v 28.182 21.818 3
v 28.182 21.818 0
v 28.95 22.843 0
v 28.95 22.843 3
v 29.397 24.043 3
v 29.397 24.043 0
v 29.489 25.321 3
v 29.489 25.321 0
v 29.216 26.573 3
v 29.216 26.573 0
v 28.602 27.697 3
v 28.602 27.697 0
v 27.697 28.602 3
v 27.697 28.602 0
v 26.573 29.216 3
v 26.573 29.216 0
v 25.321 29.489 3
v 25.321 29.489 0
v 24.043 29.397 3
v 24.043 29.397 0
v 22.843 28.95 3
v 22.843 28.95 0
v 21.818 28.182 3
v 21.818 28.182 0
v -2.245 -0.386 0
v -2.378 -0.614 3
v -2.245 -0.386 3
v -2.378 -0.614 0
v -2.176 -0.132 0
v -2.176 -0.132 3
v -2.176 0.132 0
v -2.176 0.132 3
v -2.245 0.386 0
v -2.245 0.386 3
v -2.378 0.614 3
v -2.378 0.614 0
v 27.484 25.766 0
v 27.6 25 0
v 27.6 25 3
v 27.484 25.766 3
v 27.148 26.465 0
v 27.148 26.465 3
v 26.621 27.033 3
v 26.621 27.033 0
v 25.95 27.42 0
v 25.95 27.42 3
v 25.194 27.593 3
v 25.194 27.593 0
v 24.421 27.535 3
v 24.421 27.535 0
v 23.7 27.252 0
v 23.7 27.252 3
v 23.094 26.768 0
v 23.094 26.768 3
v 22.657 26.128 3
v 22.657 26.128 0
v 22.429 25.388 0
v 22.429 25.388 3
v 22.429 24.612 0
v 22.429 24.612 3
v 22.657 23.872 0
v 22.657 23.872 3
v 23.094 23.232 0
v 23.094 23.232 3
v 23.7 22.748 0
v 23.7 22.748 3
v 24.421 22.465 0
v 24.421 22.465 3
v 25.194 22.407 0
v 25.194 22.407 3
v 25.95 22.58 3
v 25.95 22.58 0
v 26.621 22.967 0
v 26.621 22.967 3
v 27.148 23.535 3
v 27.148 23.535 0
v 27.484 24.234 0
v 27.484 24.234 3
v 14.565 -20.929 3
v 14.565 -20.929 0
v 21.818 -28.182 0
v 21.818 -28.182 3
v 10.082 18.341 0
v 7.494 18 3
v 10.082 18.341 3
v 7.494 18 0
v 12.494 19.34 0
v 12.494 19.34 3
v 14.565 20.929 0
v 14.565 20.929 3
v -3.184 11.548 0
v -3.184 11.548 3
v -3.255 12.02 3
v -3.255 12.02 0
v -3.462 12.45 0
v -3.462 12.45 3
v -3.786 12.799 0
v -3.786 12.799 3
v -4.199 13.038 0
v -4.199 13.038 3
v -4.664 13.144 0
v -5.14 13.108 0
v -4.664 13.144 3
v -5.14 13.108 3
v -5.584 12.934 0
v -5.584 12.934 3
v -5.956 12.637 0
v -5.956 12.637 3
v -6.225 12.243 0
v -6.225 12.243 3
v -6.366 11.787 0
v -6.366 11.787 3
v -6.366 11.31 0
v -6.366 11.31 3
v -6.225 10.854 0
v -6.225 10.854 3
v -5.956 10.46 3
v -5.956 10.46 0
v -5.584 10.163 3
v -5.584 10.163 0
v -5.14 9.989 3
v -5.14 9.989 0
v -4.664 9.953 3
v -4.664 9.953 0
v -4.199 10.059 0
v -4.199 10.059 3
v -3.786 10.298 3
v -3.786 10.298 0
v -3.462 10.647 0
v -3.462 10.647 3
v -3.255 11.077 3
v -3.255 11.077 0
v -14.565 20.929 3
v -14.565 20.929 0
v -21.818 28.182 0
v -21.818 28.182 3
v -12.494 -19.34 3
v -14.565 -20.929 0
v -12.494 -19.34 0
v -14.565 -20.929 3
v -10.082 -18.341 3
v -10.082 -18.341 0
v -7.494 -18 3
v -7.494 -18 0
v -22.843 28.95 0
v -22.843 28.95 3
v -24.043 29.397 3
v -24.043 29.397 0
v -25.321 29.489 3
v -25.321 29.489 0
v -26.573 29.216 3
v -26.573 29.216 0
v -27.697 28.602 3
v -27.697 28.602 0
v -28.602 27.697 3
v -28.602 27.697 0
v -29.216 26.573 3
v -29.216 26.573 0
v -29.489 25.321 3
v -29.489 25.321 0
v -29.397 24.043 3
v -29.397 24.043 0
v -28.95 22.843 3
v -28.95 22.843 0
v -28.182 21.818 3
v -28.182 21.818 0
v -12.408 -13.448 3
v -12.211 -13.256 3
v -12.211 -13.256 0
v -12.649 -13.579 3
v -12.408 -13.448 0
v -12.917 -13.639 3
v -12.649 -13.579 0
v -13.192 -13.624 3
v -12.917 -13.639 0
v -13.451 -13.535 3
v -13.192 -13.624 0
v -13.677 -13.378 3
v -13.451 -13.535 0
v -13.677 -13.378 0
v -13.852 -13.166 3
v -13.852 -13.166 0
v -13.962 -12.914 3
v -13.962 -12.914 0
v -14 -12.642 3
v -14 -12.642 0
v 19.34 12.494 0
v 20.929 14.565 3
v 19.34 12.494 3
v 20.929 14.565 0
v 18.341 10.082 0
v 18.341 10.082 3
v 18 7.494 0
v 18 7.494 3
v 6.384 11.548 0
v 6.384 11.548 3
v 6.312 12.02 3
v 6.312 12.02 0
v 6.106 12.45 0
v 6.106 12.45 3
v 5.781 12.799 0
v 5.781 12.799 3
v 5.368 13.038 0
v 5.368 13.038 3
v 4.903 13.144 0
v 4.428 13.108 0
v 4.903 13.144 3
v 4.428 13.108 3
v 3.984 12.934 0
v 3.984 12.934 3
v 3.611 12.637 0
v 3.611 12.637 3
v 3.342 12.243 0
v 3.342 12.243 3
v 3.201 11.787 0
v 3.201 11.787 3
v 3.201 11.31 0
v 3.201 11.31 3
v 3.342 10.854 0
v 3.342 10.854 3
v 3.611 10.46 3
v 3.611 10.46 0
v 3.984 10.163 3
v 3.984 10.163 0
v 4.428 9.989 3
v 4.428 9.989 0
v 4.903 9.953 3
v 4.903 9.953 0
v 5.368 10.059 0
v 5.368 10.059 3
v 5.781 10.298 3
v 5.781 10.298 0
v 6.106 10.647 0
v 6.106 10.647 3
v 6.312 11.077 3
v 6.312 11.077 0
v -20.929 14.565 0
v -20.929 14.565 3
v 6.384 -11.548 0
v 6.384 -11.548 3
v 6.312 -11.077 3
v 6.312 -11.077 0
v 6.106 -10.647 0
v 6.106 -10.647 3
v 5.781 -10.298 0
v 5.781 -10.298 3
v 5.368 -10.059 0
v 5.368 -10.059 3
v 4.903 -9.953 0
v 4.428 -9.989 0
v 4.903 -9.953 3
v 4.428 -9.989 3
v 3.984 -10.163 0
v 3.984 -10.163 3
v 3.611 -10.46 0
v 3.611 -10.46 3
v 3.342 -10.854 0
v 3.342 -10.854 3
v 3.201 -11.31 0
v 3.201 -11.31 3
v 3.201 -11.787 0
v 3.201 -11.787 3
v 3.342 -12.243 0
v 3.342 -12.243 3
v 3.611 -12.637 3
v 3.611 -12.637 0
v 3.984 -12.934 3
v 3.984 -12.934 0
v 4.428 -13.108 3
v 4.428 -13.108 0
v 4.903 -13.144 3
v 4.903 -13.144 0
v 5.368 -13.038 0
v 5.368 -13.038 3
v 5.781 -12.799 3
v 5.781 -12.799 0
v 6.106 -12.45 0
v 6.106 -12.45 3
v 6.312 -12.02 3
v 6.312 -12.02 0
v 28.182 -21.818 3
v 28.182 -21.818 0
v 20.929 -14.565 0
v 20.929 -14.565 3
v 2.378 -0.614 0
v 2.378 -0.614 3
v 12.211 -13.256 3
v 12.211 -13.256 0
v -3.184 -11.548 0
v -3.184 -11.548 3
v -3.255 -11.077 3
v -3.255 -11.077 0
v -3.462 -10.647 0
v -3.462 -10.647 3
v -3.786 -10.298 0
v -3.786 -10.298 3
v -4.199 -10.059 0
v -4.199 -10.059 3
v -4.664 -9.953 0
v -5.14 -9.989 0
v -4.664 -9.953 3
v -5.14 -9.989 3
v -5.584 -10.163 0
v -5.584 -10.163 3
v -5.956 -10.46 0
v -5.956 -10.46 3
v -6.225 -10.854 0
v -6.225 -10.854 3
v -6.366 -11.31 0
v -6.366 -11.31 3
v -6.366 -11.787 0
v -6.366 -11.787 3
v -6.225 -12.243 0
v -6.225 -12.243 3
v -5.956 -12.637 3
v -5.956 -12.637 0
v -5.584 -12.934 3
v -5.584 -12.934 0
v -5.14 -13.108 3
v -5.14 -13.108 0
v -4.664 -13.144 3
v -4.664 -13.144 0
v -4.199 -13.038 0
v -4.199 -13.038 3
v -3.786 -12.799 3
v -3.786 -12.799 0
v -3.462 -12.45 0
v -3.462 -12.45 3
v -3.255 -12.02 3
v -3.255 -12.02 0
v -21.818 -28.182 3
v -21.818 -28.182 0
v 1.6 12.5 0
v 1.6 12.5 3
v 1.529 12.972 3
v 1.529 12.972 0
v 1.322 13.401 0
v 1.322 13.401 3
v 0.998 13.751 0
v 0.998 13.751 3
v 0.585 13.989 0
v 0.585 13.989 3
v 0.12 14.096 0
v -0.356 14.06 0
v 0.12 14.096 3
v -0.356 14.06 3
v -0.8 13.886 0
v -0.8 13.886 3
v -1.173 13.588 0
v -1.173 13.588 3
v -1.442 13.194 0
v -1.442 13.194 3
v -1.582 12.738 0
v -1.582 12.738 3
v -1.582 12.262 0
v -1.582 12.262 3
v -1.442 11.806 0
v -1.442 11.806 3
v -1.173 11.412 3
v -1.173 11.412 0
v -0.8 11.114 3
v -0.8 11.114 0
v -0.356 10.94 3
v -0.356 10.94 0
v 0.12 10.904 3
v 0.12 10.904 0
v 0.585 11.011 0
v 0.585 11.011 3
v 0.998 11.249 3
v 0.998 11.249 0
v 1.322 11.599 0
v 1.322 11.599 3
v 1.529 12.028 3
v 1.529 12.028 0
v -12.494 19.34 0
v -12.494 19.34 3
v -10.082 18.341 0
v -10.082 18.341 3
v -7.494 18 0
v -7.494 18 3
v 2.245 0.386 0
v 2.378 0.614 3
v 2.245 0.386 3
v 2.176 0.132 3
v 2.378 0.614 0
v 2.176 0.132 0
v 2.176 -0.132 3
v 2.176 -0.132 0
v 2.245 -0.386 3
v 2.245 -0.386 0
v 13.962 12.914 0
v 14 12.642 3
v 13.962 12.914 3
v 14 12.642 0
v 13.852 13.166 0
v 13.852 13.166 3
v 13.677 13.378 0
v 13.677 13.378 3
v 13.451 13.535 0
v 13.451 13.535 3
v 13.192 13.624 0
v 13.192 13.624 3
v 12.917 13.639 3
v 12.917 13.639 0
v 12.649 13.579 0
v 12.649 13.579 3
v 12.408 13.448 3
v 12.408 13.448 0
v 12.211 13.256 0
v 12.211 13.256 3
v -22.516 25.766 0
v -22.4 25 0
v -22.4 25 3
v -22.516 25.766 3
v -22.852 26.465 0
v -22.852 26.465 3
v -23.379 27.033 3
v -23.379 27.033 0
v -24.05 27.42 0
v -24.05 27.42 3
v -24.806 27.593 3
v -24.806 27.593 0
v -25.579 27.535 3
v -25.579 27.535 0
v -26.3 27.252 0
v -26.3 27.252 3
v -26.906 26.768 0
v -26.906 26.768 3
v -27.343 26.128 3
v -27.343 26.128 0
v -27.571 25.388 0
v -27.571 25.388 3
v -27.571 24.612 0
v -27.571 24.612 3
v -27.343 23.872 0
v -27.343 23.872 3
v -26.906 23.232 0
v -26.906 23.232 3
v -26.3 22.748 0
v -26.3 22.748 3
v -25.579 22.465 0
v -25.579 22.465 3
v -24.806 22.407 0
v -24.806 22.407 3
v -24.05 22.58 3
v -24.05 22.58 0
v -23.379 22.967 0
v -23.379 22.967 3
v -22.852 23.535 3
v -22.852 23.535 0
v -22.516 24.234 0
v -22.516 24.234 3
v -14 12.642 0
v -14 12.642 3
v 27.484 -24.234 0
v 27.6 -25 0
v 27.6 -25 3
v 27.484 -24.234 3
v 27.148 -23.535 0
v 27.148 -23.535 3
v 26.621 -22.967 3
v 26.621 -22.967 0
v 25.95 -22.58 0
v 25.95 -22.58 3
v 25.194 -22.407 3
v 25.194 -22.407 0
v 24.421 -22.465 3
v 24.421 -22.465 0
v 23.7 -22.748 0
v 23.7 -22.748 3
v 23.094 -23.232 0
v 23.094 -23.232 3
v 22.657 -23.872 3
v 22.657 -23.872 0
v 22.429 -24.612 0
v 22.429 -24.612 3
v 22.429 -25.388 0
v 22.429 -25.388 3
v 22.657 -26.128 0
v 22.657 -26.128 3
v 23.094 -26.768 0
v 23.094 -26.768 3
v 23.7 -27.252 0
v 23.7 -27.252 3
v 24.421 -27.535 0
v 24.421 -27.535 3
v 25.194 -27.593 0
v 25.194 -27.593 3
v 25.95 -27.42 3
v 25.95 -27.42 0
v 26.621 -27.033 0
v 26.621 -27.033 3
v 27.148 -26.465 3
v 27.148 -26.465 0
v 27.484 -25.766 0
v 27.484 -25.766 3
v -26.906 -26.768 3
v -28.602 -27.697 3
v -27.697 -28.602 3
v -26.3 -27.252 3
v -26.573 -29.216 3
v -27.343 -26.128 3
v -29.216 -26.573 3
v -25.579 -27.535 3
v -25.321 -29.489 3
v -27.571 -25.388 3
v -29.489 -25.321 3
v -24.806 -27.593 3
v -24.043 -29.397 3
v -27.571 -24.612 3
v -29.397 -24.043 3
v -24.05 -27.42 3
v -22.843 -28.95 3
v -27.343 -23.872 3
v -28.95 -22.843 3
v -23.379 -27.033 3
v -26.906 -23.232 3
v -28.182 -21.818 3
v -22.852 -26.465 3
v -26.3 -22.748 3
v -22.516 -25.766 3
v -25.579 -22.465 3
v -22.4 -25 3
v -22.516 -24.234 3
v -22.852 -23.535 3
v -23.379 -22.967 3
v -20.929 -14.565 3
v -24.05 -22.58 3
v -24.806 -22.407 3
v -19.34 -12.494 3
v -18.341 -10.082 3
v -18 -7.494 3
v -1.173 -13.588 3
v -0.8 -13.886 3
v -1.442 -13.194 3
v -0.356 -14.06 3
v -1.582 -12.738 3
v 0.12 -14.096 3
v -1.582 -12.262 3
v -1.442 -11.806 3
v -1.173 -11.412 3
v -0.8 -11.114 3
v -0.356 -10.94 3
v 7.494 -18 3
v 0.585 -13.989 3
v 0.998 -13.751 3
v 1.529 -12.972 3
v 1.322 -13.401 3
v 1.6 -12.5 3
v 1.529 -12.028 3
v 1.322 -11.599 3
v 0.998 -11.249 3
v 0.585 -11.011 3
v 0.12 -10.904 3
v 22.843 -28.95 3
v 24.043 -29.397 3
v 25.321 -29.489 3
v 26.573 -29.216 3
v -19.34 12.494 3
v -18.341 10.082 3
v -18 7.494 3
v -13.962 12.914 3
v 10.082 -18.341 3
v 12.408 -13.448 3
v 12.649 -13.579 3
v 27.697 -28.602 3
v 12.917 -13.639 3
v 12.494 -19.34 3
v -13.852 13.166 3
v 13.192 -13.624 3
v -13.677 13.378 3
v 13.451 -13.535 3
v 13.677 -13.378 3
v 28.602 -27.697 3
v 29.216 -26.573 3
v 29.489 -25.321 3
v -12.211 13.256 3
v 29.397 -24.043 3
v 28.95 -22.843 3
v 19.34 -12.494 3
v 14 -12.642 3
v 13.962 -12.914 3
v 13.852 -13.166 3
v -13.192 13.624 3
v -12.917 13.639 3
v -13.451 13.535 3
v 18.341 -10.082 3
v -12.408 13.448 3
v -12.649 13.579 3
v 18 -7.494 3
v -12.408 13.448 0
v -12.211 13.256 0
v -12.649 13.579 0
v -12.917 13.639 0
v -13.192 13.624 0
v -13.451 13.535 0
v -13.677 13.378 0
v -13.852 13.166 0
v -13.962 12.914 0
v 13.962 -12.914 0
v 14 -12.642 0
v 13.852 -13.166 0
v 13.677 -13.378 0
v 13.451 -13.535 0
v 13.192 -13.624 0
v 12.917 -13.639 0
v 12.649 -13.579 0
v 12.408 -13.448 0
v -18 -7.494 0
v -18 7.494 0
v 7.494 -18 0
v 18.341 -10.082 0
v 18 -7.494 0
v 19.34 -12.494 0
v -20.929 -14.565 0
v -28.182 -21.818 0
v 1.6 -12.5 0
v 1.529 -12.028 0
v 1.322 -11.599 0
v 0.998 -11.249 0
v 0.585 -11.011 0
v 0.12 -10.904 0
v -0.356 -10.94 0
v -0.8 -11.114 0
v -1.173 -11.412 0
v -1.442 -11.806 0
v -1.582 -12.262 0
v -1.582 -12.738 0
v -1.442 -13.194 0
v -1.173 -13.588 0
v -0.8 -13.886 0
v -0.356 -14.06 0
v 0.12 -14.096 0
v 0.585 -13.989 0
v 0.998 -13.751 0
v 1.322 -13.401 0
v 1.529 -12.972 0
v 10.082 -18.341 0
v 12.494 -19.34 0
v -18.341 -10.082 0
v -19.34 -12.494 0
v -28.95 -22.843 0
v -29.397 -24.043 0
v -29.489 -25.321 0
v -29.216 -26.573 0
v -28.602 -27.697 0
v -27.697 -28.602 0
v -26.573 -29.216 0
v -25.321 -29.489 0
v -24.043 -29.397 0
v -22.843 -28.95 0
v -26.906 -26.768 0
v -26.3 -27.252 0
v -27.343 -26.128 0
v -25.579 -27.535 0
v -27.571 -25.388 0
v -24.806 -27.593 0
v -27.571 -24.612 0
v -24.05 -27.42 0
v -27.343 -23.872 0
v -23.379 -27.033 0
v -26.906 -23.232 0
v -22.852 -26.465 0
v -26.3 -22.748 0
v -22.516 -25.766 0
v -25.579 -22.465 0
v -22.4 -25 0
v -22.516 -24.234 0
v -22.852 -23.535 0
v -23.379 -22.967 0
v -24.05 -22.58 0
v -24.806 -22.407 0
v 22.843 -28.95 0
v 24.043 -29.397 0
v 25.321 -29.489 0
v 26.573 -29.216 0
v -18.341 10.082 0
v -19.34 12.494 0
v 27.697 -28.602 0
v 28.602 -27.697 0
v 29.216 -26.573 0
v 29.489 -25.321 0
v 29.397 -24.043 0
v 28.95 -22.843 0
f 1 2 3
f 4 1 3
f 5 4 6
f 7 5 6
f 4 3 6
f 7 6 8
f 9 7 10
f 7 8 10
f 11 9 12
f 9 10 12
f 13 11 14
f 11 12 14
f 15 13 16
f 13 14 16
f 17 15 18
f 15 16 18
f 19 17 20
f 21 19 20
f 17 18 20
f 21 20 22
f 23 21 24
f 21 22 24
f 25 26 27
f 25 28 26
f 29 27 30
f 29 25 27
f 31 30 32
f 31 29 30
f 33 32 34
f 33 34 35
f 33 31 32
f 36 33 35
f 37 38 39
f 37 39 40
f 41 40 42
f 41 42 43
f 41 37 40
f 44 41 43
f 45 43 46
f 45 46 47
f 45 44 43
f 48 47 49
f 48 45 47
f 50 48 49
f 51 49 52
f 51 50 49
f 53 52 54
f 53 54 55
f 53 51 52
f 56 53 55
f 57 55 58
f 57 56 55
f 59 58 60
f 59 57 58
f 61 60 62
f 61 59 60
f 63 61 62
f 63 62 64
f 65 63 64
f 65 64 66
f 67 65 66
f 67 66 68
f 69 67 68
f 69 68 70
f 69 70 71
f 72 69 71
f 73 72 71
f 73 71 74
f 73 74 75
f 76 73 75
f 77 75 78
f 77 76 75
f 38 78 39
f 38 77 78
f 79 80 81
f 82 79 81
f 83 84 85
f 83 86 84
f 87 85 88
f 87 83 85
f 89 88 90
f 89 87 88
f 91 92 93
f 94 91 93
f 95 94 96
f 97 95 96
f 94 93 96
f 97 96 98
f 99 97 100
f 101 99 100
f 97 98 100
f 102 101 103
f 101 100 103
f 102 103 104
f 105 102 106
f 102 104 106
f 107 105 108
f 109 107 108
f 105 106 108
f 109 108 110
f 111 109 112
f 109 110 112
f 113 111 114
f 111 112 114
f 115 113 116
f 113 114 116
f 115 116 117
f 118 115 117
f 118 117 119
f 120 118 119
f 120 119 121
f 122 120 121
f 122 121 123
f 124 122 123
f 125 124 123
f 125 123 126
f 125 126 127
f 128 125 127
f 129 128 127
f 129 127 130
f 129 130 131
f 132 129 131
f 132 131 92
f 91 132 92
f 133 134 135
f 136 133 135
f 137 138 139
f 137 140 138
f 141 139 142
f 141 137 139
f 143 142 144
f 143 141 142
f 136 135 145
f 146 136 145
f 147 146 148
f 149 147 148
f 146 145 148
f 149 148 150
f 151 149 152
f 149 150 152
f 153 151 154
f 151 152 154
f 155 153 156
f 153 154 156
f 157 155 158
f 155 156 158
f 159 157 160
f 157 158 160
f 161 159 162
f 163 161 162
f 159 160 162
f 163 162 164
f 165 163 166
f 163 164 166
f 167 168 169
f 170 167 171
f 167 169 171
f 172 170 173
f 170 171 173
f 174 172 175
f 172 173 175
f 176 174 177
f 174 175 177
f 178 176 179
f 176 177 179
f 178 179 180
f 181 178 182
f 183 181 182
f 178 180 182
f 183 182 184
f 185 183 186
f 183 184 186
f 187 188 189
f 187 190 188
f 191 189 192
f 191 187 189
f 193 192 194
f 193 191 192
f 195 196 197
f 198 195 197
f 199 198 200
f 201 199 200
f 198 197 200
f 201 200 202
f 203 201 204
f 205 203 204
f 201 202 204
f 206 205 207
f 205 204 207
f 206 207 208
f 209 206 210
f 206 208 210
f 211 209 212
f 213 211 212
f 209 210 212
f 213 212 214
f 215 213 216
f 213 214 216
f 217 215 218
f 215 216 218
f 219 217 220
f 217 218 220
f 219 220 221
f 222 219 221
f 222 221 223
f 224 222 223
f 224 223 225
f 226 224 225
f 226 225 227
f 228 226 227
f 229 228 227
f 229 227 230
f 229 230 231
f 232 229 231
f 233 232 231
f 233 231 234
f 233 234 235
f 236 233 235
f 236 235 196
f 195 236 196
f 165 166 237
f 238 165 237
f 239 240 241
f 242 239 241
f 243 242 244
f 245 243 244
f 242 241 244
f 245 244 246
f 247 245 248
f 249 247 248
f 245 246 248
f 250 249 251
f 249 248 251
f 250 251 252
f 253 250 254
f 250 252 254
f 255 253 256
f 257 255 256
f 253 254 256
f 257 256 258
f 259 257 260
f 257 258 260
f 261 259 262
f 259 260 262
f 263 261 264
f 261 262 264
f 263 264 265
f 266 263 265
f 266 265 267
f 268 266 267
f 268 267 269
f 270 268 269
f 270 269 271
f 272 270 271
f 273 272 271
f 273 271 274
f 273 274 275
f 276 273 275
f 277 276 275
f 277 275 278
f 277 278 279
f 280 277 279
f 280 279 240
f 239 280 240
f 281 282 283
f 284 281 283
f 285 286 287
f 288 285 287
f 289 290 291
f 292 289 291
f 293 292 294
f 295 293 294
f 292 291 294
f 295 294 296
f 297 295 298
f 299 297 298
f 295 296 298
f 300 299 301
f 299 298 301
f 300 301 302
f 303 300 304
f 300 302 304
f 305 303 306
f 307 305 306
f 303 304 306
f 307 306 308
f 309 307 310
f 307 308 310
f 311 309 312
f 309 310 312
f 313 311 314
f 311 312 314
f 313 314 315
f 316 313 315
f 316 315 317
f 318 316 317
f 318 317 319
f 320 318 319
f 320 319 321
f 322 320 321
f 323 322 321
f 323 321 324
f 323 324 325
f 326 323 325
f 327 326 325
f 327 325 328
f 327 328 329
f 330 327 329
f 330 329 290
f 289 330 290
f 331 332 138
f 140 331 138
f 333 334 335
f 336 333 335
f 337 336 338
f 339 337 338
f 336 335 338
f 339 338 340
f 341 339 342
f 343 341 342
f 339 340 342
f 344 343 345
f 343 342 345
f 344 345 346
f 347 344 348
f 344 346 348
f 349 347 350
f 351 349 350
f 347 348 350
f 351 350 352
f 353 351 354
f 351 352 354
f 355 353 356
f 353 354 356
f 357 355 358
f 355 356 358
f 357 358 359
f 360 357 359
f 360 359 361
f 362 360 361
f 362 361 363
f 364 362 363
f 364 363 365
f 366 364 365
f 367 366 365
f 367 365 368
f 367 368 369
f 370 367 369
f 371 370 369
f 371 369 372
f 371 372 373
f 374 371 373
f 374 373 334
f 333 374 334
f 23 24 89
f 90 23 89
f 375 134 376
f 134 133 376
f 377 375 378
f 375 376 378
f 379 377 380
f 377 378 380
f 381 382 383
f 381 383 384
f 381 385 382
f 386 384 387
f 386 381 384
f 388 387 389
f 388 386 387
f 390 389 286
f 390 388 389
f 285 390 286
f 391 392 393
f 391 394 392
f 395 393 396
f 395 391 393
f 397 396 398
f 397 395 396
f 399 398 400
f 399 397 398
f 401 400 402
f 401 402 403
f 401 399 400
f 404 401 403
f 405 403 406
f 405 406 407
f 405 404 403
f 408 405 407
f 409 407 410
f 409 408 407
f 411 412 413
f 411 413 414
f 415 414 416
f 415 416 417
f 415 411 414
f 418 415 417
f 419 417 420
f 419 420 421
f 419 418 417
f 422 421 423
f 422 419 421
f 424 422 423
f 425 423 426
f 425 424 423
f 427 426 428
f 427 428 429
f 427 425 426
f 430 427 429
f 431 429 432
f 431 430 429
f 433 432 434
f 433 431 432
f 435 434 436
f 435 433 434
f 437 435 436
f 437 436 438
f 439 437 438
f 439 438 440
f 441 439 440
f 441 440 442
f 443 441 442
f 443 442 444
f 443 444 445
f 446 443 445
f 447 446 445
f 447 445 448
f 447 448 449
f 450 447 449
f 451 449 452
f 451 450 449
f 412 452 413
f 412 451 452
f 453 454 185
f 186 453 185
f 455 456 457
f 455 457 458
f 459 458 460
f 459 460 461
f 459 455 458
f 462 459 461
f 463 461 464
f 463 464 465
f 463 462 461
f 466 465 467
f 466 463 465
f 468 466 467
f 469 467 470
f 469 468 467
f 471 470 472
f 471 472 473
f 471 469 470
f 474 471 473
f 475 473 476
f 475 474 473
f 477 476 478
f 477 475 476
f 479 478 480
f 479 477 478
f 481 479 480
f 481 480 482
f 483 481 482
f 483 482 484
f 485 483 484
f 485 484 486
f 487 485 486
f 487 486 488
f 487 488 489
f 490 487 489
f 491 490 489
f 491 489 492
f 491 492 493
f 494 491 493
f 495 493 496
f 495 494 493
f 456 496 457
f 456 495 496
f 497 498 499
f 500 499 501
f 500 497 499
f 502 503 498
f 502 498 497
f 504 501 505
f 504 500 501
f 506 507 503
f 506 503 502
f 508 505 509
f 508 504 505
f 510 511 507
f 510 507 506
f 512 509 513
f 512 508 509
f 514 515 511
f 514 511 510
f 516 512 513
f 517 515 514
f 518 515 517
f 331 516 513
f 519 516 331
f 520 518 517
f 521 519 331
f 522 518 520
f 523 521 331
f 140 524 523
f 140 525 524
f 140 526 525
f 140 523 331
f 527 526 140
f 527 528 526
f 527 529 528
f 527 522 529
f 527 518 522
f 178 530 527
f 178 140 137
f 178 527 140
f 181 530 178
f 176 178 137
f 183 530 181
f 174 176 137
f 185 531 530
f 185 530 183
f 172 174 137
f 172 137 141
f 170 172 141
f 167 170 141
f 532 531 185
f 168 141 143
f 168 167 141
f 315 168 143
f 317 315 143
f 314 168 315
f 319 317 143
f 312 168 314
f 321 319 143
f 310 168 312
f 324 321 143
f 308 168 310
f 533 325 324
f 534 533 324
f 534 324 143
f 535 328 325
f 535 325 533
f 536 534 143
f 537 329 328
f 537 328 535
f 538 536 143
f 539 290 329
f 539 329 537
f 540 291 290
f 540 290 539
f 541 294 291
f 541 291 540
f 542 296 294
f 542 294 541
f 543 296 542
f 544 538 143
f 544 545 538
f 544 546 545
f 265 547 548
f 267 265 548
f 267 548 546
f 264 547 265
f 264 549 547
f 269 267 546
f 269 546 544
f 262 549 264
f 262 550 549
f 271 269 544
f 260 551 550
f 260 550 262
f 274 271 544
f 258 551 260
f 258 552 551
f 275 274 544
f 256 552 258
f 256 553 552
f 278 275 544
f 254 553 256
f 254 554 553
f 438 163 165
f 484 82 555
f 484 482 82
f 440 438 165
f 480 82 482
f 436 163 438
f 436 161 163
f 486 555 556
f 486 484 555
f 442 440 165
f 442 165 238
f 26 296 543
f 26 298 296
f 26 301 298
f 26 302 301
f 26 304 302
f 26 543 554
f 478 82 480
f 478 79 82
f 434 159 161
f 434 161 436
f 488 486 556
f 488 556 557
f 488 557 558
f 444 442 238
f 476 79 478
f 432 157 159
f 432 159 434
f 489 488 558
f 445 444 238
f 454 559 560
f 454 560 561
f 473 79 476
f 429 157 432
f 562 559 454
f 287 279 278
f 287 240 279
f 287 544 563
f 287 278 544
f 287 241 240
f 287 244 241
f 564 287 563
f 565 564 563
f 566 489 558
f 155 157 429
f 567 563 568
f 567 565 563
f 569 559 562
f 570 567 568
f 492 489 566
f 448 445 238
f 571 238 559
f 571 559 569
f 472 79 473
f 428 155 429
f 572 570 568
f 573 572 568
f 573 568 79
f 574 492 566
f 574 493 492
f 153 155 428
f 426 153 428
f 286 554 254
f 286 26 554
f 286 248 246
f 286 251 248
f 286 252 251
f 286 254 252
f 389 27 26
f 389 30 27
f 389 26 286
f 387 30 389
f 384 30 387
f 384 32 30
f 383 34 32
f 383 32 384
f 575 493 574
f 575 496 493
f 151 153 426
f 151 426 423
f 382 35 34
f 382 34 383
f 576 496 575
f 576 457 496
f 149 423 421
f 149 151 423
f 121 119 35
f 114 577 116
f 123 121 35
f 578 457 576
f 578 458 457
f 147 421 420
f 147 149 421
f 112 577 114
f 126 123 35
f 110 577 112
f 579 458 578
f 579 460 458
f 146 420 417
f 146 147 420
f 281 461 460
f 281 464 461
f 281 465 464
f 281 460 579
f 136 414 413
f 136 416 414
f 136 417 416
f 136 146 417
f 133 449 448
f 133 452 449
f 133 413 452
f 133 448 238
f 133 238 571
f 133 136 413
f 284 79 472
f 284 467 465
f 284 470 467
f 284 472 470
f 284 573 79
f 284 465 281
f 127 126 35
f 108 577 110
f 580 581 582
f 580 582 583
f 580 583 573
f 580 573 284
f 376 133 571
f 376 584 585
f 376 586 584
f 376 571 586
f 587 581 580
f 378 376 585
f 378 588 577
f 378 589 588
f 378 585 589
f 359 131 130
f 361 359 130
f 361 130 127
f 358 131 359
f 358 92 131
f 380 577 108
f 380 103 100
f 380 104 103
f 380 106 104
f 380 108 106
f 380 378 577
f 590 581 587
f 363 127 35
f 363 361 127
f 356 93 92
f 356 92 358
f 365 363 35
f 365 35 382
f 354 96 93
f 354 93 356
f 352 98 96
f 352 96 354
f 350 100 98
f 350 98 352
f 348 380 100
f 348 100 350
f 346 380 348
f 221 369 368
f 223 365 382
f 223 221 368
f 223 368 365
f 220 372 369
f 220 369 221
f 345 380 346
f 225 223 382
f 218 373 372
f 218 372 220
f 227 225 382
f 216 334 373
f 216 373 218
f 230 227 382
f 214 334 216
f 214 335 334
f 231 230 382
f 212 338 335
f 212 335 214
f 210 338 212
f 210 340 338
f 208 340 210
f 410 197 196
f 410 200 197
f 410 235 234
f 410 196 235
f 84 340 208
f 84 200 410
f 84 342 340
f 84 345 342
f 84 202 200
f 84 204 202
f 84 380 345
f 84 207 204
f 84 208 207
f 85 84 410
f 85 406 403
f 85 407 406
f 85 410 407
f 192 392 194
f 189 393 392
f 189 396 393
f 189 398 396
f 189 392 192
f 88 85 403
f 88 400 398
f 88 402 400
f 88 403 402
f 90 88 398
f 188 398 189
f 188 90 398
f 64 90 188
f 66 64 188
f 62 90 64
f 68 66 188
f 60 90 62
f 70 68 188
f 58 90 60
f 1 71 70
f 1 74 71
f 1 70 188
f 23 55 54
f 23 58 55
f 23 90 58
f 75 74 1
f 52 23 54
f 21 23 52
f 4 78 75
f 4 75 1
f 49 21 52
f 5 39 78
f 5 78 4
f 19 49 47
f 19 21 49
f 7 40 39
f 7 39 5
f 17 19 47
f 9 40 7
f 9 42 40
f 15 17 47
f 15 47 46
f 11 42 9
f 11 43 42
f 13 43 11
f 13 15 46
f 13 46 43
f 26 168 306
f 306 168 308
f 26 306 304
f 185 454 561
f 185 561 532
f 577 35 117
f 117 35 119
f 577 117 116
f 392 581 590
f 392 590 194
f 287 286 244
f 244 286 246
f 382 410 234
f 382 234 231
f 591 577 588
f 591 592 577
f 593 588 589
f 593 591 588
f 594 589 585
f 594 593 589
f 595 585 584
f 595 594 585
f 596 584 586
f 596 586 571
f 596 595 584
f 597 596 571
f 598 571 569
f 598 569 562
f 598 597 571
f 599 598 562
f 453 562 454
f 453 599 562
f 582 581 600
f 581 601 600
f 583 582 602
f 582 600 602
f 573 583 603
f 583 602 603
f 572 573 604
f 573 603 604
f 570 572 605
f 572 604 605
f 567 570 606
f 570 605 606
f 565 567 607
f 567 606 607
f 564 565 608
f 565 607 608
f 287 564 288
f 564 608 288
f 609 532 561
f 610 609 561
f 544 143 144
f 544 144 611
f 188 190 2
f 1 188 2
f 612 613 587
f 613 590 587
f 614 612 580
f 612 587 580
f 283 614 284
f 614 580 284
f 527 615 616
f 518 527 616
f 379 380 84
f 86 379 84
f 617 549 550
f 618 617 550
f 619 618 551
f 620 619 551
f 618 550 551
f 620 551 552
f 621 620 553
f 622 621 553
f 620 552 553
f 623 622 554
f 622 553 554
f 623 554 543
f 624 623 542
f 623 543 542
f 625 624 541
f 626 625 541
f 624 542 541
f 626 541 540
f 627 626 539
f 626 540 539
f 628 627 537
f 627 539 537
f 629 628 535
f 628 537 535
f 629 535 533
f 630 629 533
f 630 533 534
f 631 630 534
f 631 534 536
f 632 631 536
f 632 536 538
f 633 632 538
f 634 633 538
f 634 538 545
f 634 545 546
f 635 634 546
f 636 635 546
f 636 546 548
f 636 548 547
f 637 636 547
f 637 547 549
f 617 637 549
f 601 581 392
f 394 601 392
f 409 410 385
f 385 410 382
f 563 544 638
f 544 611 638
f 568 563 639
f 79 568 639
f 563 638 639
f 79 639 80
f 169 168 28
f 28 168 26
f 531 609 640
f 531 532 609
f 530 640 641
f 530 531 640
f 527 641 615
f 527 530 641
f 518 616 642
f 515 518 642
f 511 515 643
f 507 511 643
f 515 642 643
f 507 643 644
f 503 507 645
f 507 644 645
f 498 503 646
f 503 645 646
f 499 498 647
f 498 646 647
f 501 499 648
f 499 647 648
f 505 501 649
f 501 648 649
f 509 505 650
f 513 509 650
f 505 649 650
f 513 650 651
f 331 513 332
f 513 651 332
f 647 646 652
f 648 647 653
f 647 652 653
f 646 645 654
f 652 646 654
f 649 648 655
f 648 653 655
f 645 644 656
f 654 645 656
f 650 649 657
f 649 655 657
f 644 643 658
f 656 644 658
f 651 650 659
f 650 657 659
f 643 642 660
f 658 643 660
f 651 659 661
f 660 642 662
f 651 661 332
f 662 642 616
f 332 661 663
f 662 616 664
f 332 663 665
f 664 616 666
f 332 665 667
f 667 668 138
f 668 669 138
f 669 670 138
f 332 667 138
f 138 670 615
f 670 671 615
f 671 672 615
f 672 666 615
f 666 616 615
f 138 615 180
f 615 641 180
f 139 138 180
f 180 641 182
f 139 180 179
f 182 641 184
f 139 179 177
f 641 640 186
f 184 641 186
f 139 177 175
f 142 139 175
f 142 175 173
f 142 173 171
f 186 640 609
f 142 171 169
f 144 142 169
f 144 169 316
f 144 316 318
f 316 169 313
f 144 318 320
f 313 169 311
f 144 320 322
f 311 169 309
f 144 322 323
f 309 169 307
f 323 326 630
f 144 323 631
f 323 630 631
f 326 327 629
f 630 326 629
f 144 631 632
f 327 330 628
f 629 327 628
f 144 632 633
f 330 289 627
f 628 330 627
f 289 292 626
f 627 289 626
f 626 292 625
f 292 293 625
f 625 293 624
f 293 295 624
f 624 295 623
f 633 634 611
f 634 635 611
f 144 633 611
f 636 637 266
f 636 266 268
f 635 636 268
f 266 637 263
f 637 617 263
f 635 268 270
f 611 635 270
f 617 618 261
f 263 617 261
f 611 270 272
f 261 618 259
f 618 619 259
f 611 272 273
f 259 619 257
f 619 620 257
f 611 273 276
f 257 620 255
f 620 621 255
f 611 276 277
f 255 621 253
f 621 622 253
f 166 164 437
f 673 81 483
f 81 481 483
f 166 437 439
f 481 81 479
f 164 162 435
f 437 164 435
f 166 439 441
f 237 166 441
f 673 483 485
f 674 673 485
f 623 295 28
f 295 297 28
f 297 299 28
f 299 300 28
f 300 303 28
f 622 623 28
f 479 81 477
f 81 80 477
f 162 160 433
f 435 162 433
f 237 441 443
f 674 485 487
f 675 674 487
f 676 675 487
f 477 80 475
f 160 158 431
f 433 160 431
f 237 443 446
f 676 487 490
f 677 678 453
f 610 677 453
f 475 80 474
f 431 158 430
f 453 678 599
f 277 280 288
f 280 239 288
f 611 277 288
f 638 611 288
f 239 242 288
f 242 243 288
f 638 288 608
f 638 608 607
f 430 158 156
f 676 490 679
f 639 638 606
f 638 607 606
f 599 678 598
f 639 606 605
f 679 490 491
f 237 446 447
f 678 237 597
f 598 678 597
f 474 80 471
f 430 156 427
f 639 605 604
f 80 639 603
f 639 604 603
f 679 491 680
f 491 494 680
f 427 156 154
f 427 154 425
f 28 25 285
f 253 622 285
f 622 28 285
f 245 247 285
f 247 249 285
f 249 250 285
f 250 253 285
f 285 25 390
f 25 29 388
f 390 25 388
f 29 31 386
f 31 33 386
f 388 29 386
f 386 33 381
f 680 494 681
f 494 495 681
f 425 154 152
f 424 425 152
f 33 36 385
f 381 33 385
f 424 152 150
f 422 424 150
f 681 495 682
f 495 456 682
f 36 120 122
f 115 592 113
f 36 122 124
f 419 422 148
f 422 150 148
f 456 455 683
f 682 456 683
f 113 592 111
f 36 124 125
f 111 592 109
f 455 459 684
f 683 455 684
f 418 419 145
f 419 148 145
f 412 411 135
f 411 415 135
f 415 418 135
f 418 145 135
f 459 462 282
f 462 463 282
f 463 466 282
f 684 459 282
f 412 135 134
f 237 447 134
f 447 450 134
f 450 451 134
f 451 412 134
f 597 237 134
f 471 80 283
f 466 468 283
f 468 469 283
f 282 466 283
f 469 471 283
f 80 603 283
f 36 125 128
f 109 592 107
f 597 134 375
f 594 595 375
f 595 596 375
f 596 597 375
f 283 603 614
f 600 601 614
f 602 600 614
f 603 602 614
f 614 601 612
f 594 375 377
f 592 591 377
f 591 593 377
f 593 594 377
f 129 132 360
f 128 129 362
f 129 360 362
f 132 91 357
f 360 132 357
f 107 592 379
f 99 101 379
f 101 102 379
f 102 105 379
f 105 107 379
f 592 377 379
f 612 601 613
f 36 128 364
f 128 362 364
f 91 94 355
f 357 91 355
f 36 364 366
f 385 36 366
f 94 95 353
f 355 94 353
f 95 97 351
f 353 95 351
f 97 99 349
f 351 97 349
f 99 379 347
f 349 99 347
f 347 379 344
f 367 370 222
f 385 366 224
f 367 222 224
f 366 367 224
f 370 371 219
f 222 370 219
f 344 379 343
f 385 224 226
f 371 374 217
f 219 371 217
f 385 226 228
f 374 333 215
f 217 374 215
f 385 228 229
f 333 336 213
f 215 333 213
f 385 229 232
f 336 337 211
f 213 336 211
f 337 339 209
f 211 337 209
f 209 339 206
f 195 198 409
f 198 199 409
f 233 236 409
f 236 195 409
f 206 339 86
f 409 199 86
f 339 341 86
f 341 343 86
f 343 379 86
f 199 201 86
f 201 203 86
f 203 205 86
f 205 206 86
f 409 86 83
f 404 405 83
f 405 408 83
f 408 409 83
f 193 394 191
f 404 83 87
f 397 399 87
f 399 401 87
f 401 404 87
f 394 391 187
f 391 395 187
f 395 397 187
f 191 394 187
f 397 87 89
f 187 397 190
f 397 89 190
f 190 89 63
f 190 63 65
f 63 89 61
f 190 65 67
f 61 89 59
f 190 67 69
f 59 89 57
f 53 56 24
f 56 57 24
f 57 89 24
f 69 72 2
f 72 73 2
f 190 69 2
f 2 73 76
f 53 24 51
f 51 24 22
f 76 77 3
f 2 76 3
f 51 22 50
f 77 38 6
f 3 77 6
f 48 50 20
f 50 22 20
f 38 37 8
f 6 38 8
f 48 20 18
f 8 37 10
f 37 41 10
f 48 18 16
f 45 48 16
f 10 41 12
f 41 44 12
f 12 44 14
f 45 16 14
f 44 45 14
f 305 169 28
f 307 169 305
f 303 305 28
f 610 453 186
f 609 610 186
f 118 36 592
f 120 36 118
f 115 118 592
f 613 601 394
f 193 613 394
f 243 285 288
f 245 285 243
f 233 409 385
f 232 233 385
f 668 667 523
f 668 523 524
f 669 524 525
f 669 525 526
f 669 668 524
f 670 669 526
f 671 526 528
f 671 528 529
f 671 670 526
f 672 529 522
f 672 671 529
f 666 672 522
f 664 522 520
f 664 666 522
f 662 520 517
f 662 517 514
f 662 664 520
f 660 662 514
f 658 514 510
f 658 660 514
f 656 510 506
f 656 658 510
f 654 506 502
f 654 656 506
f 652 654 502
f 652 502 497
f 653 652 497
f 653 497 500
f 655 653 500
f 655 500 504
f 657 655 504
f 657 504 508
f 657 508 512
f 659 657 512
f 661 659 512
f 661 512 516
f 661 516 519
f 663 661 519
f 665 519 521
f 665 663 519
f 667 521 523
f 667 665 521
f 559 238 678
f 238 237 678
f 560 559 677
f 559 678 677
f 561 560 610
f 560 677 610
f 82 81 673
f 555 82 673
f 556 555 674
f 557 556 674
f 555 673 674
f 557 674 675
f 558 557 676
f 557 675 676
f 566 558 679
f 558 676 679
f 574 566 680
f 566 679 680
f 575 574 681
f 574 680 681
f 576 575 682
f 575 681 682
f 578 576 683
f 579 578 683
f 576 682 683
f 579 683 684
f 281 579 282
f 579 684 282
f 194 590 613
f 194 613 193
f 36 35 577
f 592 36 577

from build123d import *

# Parameters (mm, degrees)
SKETCH_1_R          = 2.6
EXTRUDE_1_DEPTH     = 3
SKETCH_2_W          = 36
SKETCH_2_H          = 36
EXTRUDE_2_DEPTH     = 3
CUT_EXTRUDE_1_REACH = 43.827
SKETCH_3_R          = 1.6
CUT_EXTRUDE_2_DEPTH = 3
FILLET_1_R          = 1
FILLET_2_R          = 10


with BuildPart() as part:
    # 草图1 → 凸台-拉伸1 (new body)
    # profile 1 of 5: a face of its own
    with BuildSketch(Plane.XY):
        with BuildLine():
            Line((-28.181980515, 21.818019485), (-6.363961031, 0))
            Line((-6.363961031, 0), (0, 6.363961031))
            Line((0, 6.363961031), (-21.818019485, 28.181980515))
            ThreePointArc((-21.818019485, 28.181980515), (-28.181980515, 28.181980515), (-28.181980515, 21.818019485))
        make_face()
        with Locations((-25, 25)):
            Circle(SKETCH_1_R, mode=Mode.SUBTRACT)
    # profile 2 of 5: a face of its own
    with BuildSketch(Plane.XY):
        with BuildLine():
            Line((-6.363961031, 0), (-28.181980515, -21.818019485))
            ThreePointArc((-28.181980515, -21.818019485), (-28.181980515, -28.181980515), (-21.818019485, -28.181980515))
            Line((-21.818019485, -28.181980515), (0, -6.363961031))
            Line((0, -6.363961031), (-6.363961031, 0))
        make_face()
        with Locations((-25, -25)):
            Circle(SKETCH_1_R, mode=Mode.SUBTRACT)
    # profile 3 of 5: a face of its own
    with BuildSketch(Plane.XY):
        with BuildLine():
            Line((6.363961031, 0), (0, -6.363961031))
            Line((0, -6.363961031), (21.818019485, -28.181980515))
            ThreePointArc((21.818019485, -28.181980515), (28.181980515, -28.181980515), (28.181980515, -21.818019485))
            Line((28.181980515, -21.818019485), (6.363961031, 0))
        make_face()
        with Locations((25, -25)):
            Circle(SKETCH_1_R, mode=Mode.SUBTRACT)
    # profile 4 of 5: a face of its own
    with BuildSketch(Plane.XY):
        with BuildLine():
            Line((21.818019485, 28.181980515), (0, 6.363961031))
            Line((0, 6.363961031), (6.363961031, 0))
            Line((6.363961031, 0), (28.181980515, 21.818019485))
            ThreePointArc((28.181980515, 21.818019485), (28.181980515, 28.181980515), (21.818019485, 28.181980515))
        make_face()
        with Locations((25, 25)):
            Circle(SKETCH_1_R, mode=Mode.SUBTRACT)
    # profile 5 of 5: a face of its own
    with BuildSketch(Plane.XY):
        Polygon((0, 6.363961031), (-6.363961031, 0), (0, -6.363961031), (6.363961031, 0), align=None)
    extrude(amount=EXTRUDE_1_DEPTH)

    # 草图2 → 凸台-拉伸2 (add)
    with BuildSketch(Plane.XY.offset(3)):
        Rectangle(SKETCH_2_W, SKETCH_2_H)
    extrude(amount=-EXTRUDE_2_DEPTH)

    # 草图3 → 切除-拉伸1 (cut, up to next)
    with BuildSketch(Plane.XY.offset(3), mode=Mode.PRIVATE) as cut_extrude_1_sk1:
        with Locations((0, -12.5)):
            Circle(SKETCH_3_R)
    cut_extrude_1_tool1 = extrude(cut_extrude_1_sk1.sketch, amount=-CUT_EXTRUDE_1_REACH, mode=Mode.PRIVATE) & part.part
    # 草图3 → 切除-拉伸1 (cut, up to next)
    with BuildSketch(Plane.XY.offset(3), mode=Mode.PRIVATE) as cut_extrude_1_sk2:
        with Locations((0, 12.5)):
            Circle(SKETCH_3_R)
    cut_extrude_1_tool2 = extrude(cut_extrude_1_sk2.sketch, amount=-CUT_EXTRUDE_1_REACH, mode=Mode.PRIVATE) & part.part
    # 草图3 → 切除-拉伸1 (cut, up to next)
    with BuildSketch(Plane.XY.offset(3), mode=Mode.PRIVATE) as cut_extrude_1_sk3:
        with Locations((4.783542905, 11.548494156)):
            Circle(SKETCH_3_R)
    cut_extrude_1_tool3 = extrude(cut_extrude_1_sk3.sketch, amount=-CUT_EXTRUDE_1_REACH, mode=Mode.PRIVATE) & part.part
    # 草图3 → 切除-拉伸1 (cut, up to next)
    with BuildSketch(Plane.XY.offset(3), mode=Mode.PRIVATE) as cut_extrude_1_sk4:
        with Locations((-4.783542905, -11.548494156)):
            Circle(SKETCH_3_R)
    cut_extrude_1_tool4 = extrude(cut_extrude_1_sk4.sketch, amount=-CUT_EXTRUDE_1_REACH, mode=Mode.PRIVATE) & part.part
    # 草图3 → 切除-拉伸1 (cut, up to next)
    with BuildSketch(Plane.XY.offset(3), mode=Mode.PRIVATE) as cut_extrude_1_sk5:
        with Locations((4.783542905, -11.548494156)):
            Circle(SKETCH_3_R)
    cut_extrude_1_tool5 = extrude(cut_extrude_1_sk5.sketch, amount=-CUT_EXTRUDE_1_REACH, mode=Mode.PRIVATE) & part.part
    # 草图3 → 切除-拉伸1 (cut, up to next)
    with BuildSketch(Plane.XY.offset(3), mode=Mode.PRIVATE) as cut_extrude_1_sk6:
        with Locations((-4.783542905, 11.548494156)):
            Circle(SKETCH_3_R)
    cut_extrude_1_tool6 = extrude(cut_extrude_1_sk6.sketch, amount=-CUT_EXTRUDE_1_REACH, mode=Mode.PRIVATE) & part.part
    add(cut_extrude_1_tool1.solids().sort_by_distance((0, -12.5, 3))[0], mode=Mode.SUBTRACT)
    add(cut_extrude_1_tool2.solids().sort_by_distance((0, 12.5, 3))[0], mode=Mode.SUBTRACT)
    add(cut_extrude_1_tool3.solids().sort_by_distance((4.783543, 11.548494, 3))[0], mode=Mode.SUBTRACT)
    add(cut_extrude_1_tool4.solids().sort_by_distance((-4.783543, -11.548494, 3))[0], mode=Mode.SUBTRACT)
    add(cut_extrude_1_tool5.solids().sort_by_distance((4.783543, -11.548494, 3))[0], mode=Mode.SUBTRACT)
    add(cut_extrude_1_tool6.solids().sort_by_distance((-4.783543, 11.548494, 3))[0], mode=Mode.SUBTRACT)

    # 草图4 → 切除-拉伸2 (cut)
    with BuildSketch(Plane.XY.offset(3)):
        Polygon((14, -15.556766946), (14, 15.556766946), (1.900292375, 0), align=None)
        Polygon((-14, -15.556766946), (-1.900292375, 0), (-14, 15.556766946), align=None)
    extrude(amount=-CUT_EXTRUDE_2_DEPTH, mode=Mode.SUBTRACT)

    # 圆角1
    fillet_1_edges = [part.edges().sort_by_distance(p)[0] for p in [
        (14, 15.556766946, 1.5),
        (14, -15.556766946, 1.5),
        (1.900292375, 0, 1.5),
        (-14, -15.556766946, 1.5),
        (-14, 15.556766946, 1.5),
        (-1.900292375, 0, 1.5),
    ]]
    fillet(fillet_1_edges, radius=FILLET_1_R)

    # 圆角2
    fillet_2_edges = [part.edges().sort_by_distance(p)[0] for p in [
        (18, -11.636038969, 1.5),
        (-11.636038969, -18, 1.5),
        (-18, -11.636038969, 1.5),
        (18, 11.636038969, 1.5),
        (11.636038969, -18, 1.5),
        (-18, 11.636038969, 1.5),
        (-11.636038969, 18, 1.5),
        (11.636038969, 18, 1.5),
    ]]
    fillet(fillet_2_edges, radius=FILLET_2_R)


solid = part.part
